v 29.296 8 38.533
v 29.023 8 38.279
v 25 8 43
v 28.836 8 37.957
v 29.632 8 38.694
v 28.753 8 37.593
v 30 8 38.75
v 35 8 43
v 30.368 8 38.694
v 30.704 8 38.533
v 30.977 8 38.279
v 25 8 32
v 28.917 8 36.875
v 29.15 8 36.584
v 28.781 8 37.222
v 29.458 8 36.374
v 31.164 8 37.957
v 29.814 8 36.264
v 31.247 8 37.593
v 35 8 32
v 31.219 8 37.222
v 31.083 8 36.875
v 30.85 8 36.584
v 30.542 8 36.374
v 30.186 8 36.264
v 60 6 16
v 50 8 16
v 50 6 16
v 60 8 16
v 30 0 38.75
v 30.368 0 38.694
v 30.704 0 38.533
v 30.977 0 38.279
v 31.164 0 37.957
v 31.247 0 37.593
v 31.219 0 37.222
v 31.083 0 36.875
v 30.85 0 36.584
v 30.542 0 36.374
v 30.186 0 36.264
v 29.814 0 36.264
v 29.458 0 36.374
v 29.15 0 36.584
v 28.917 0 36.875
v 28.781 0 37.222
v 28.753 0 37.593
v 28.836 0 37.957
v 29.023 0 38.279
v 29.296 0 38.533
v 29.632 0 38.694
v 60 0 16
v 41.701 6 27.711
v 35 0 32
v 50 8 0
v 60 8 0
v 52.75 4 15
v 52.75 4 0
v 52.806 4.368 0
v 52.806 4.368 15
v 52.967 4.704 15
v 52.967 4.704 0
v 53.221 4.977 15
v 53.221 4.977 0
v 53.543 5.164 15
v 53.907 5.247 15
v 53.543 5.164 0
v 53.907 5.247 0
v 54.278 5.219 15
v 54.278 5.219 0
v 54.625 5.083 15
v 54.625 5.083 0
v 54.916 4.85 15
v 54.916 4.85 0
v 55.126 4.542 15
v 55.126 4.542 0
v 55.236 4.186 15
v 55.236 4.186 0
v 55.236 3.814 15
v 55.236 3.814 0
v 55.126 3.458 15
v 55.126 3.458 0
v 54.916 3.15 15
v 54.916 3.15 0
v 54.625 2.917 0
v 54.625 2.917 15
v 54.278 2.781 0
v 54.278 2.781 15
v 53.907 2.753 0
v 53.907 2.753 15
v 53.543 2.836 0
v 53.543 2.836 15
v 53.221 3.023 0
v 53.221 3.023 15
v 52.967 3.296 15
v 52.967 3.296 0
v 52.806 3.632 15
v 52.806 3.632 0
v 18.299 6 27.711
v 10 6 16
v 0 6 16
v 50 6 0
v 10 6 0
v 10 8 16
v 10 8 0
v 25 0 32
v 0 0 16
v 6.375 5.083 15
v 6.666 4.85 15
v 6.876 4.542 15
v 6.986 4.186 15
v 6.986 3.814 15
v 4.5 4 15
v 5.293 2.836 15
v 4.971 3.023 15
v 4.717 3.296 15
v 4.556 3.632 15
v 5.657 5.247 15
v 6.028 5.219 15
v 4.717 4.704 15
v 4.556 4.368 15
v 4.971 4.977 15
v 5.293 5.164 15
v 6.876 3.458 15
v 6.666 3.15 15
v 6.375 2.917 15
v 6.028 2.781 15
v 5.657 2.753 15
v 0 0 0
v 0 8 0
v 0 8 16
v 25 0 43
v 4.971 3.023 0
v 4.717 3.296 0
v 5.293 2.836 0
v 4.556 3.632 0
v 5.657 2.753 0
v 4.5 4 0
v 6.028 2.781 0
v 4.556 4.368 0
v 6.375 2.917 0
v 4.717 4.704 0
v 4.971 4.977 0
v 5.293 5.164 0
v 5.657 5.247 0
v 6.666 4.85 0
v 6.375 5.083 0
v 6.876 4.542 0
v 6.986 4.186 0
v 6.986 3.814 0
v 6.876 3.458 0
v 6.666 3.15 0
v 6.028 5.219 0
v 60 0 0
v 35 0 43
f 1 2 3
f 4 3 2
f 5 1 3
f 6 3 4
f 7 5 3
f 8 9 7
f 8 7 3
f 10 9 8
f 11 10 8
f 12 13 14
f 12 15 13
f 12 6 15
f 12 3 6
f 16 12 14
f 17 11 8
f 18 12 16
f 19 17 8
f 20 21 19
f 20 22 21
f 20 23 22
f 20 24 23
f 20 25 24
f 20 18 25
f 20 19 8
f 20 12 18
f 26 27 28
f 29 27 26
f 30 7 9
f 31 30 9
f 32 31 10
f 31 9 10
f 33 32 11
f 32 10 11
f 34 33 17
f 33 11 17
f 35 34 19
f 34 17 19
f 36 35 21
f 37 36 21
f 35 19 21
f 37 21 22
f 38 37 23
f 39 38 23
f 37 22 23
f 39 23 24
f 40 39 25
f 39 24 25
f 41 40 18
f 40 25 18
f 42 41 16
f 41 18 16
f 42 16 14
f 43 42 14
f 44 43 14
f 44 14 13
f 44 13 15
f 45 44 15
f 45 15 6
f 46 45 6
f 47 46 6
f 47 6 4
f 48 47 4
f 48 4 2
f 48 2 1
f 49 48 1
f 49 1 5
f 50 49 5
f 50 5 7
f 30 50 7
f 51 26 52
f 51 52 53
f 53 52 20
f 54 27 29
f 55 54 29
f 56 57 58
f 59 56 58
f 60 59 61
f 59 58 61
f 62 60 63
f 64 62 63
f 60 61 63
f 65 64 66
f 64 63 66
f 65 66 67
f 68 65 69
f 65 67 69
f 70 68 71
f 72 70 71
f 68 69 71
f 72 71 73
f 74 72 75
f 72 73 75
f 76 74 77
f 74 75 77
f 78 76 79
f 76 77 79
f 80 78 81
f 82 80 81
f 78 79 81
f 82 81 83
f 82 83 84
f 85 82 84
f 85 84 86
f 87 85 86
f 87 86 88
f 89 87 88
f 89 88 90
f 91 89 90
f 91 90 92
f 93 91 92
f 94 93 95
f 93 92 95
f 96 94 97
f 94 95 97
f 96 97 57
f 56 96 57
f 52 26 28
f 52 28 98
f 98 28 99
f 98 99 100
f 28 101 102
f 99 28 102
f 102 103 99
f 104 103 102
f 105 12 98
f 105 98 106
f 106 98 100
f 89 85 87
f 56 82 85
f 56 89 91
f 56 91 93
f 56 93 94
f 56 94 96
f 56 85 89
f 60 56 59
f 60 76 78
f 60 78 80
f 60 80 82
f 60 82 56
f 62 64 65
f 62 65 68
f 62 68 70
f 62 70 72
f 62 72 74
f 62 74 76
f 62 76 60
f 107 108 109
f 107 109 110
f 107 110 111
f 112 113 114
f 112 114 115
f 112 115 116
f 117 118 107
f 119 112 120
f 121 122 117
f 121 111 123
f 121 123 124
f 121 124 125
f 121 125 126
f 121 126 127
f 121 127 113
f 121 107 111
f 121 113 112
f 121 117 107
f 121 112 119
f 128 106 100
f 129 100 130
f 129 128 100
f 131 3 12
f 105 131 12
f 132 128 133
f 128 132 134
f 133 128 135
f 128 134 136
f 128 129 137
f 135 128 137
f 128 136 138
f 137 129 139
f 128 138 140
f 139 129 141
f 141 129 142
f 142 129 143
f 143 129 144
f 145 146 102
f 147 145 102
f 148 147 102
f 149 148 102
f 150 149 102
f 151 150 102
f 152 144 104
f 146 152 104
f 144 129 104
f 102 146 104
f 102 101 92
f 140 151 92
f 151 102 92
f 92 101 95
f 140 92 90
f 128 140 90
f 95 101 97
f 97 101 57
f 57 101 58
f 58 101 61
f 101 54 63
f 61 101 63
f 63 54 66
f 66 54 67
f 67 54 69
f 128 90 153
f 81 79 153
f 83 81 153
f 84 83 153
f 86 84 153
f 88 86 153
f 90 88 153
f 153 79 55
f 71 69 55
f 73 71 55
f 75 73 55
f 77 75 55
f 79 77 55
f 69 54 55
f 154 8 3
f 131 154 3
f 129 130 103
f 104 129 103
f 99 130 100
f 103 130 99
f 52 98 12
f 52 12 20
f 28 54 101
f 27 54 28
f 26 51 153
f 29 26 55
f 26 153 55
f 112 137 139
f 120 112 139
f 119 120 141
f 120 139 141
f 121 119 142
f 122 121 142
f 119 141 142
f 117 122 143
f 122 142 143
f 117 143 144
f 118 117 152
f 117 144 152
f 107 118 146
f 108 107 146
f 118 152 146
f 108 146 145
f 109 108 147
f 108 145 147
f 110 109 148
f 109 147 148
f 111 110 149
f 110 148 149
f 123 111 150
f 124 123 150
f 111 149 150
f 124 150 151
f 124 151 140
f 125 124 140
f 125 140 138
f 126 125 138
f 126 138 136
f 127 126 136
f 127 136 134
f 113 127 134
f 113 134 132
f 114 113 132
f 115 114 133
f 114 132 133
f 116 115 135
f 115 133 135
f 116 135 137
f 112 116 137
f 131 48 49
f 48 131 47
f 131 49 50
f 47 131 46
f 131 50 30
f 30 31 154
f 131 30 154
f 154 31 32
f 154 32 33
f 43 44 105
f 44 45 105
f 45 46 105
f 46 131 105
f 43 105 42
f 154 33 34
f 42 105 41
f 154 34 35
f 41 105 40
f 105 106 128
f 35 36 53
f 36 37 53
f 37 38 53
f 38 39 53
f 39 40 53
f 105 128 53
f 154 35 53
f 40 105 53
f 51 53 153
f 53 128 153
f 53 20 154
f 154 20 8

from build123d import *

# Parameters (mm, degrees)
ESQUISSE1_W             = 60
ESQUISSE1_H             = 8
BOSS_EXTRU_1_DEPTH      = 60
ESQUISSE2_R             = 1.25
ENL_V_MAT_EXTRU_1_DEPTH = 15
ESQUISSE3_R             = 1.25
ENL_V_MAT_EXTRU_2_DEPTH = 15
ESQUISSE4_W             = 10
ESQUISSE4_H             = 11
ENL_V_MAT_EXTRU_3_DEPTH = 2
ENL_V_MAT_EXTRU_4_DEPTH = 52
CHANFREIN1_SIZE2        = 4.289013841
CHANFREIN1_SIZE         = 2


with BuildPart() as part:
    # Esquisse1 → Boss.-Extru.1 (new body)
    with BuildSketch(Plane.XY):
        with Locations((30, 4)):
            Rectangle(ESQUISSE1_W, ESQUISSE1_H)
    extrude(amount=BOSS_EXTRU_1_DEPTH)

    # Esquisse2 → Enlèv. mat.-Extru.1 (cut)
    with BuildSketch(Plane(origin=(0, 0, 0), x_dir=(-1, 0, 0), z_dir=(0, 0, -1))):
        with Locations((-54, 4)):
            Circle(ESQUISSE2_R)
        with Locations((-5.75, 4)):
            Circle(ESQUISSE2_R)
    extrude(amount=-ENL_V_MAT_EXTRU_1_DEPTH, mode=Mode.SUBTRACT)

    # Esquisse3 → Enlèv. mat.-Extru.2 (cut)
    with BuildSketch(Plane(origin=(0, 8, 0), x_dir=(1, 0, 0), z_dir=(0, 1, 0))):
        with Locations(Location((30, -37.5, 0), (0, 0, 270))):
            Circle(ESQUISSE3_R)
    extrude(amount=-ENL_V_MAT_EXTRU_2_DEPTH, mode=Mode.SUBTRACT)

    # Esquisse4 → Enlèv. mat.-Extru.3 (cut)
    with BuildSketch(Plane(origin=(0, 8, 0), x_dir=(1, 0, 0), z_dir=(0, 1, 0))):
        Polygon((0, -16), (10, -16), (10, 0), (50, 0), (50, -16), (60, -16), (60, -60), (0, -60), align=None)
        with Locations((30, -37.5)):
            Rectangle(ESQUISSE4_W, ESQUISSE4_H, mode=Mode.SUBTRACT)
    extrude(amount=-ENL_V_MAT_EXTRU_3_DEPTH, mode=Mode.SUBTRACT)

    # Esquisse5 → Enlèv. mat.-Extru.4 (cut)
    with BuildSketch(Plane(origin=(0, 6, 0), x_dir=(1, 0, 0), z_dir=(0, 1, 0))):
        Polygon((60, -16), (35, -32), (35, -43), (25, -43), (25, -32), (0, -16), (-21.594855386, -85.475485762), (75.414479662, -69.930764824), align=None)
    extrude(amount=-ENL_V_MAT_EXTRU_4_DEPTH, mode=Mode.SUBTRACT)

    # Chanfrein1
    chanfrein1_edges = [part.edges().sort_by_distance(p)[0] for p in [
        (30, 6, 32),
    ]]
    chanfrein1_side = [part.faces().sort_by_distance(p)[0] for p in [
        (30, 6.04, 32),
    ]]
    chamfer(chanfrein1_edges, length=CHANFREIN1_SIZE - 0.0001, length2=CHANFREIN1_SIZE2 - 0.0001, reference=chanfrein1_side[0])  # a hair under: the kernel refuses the full size


solid = part.part
